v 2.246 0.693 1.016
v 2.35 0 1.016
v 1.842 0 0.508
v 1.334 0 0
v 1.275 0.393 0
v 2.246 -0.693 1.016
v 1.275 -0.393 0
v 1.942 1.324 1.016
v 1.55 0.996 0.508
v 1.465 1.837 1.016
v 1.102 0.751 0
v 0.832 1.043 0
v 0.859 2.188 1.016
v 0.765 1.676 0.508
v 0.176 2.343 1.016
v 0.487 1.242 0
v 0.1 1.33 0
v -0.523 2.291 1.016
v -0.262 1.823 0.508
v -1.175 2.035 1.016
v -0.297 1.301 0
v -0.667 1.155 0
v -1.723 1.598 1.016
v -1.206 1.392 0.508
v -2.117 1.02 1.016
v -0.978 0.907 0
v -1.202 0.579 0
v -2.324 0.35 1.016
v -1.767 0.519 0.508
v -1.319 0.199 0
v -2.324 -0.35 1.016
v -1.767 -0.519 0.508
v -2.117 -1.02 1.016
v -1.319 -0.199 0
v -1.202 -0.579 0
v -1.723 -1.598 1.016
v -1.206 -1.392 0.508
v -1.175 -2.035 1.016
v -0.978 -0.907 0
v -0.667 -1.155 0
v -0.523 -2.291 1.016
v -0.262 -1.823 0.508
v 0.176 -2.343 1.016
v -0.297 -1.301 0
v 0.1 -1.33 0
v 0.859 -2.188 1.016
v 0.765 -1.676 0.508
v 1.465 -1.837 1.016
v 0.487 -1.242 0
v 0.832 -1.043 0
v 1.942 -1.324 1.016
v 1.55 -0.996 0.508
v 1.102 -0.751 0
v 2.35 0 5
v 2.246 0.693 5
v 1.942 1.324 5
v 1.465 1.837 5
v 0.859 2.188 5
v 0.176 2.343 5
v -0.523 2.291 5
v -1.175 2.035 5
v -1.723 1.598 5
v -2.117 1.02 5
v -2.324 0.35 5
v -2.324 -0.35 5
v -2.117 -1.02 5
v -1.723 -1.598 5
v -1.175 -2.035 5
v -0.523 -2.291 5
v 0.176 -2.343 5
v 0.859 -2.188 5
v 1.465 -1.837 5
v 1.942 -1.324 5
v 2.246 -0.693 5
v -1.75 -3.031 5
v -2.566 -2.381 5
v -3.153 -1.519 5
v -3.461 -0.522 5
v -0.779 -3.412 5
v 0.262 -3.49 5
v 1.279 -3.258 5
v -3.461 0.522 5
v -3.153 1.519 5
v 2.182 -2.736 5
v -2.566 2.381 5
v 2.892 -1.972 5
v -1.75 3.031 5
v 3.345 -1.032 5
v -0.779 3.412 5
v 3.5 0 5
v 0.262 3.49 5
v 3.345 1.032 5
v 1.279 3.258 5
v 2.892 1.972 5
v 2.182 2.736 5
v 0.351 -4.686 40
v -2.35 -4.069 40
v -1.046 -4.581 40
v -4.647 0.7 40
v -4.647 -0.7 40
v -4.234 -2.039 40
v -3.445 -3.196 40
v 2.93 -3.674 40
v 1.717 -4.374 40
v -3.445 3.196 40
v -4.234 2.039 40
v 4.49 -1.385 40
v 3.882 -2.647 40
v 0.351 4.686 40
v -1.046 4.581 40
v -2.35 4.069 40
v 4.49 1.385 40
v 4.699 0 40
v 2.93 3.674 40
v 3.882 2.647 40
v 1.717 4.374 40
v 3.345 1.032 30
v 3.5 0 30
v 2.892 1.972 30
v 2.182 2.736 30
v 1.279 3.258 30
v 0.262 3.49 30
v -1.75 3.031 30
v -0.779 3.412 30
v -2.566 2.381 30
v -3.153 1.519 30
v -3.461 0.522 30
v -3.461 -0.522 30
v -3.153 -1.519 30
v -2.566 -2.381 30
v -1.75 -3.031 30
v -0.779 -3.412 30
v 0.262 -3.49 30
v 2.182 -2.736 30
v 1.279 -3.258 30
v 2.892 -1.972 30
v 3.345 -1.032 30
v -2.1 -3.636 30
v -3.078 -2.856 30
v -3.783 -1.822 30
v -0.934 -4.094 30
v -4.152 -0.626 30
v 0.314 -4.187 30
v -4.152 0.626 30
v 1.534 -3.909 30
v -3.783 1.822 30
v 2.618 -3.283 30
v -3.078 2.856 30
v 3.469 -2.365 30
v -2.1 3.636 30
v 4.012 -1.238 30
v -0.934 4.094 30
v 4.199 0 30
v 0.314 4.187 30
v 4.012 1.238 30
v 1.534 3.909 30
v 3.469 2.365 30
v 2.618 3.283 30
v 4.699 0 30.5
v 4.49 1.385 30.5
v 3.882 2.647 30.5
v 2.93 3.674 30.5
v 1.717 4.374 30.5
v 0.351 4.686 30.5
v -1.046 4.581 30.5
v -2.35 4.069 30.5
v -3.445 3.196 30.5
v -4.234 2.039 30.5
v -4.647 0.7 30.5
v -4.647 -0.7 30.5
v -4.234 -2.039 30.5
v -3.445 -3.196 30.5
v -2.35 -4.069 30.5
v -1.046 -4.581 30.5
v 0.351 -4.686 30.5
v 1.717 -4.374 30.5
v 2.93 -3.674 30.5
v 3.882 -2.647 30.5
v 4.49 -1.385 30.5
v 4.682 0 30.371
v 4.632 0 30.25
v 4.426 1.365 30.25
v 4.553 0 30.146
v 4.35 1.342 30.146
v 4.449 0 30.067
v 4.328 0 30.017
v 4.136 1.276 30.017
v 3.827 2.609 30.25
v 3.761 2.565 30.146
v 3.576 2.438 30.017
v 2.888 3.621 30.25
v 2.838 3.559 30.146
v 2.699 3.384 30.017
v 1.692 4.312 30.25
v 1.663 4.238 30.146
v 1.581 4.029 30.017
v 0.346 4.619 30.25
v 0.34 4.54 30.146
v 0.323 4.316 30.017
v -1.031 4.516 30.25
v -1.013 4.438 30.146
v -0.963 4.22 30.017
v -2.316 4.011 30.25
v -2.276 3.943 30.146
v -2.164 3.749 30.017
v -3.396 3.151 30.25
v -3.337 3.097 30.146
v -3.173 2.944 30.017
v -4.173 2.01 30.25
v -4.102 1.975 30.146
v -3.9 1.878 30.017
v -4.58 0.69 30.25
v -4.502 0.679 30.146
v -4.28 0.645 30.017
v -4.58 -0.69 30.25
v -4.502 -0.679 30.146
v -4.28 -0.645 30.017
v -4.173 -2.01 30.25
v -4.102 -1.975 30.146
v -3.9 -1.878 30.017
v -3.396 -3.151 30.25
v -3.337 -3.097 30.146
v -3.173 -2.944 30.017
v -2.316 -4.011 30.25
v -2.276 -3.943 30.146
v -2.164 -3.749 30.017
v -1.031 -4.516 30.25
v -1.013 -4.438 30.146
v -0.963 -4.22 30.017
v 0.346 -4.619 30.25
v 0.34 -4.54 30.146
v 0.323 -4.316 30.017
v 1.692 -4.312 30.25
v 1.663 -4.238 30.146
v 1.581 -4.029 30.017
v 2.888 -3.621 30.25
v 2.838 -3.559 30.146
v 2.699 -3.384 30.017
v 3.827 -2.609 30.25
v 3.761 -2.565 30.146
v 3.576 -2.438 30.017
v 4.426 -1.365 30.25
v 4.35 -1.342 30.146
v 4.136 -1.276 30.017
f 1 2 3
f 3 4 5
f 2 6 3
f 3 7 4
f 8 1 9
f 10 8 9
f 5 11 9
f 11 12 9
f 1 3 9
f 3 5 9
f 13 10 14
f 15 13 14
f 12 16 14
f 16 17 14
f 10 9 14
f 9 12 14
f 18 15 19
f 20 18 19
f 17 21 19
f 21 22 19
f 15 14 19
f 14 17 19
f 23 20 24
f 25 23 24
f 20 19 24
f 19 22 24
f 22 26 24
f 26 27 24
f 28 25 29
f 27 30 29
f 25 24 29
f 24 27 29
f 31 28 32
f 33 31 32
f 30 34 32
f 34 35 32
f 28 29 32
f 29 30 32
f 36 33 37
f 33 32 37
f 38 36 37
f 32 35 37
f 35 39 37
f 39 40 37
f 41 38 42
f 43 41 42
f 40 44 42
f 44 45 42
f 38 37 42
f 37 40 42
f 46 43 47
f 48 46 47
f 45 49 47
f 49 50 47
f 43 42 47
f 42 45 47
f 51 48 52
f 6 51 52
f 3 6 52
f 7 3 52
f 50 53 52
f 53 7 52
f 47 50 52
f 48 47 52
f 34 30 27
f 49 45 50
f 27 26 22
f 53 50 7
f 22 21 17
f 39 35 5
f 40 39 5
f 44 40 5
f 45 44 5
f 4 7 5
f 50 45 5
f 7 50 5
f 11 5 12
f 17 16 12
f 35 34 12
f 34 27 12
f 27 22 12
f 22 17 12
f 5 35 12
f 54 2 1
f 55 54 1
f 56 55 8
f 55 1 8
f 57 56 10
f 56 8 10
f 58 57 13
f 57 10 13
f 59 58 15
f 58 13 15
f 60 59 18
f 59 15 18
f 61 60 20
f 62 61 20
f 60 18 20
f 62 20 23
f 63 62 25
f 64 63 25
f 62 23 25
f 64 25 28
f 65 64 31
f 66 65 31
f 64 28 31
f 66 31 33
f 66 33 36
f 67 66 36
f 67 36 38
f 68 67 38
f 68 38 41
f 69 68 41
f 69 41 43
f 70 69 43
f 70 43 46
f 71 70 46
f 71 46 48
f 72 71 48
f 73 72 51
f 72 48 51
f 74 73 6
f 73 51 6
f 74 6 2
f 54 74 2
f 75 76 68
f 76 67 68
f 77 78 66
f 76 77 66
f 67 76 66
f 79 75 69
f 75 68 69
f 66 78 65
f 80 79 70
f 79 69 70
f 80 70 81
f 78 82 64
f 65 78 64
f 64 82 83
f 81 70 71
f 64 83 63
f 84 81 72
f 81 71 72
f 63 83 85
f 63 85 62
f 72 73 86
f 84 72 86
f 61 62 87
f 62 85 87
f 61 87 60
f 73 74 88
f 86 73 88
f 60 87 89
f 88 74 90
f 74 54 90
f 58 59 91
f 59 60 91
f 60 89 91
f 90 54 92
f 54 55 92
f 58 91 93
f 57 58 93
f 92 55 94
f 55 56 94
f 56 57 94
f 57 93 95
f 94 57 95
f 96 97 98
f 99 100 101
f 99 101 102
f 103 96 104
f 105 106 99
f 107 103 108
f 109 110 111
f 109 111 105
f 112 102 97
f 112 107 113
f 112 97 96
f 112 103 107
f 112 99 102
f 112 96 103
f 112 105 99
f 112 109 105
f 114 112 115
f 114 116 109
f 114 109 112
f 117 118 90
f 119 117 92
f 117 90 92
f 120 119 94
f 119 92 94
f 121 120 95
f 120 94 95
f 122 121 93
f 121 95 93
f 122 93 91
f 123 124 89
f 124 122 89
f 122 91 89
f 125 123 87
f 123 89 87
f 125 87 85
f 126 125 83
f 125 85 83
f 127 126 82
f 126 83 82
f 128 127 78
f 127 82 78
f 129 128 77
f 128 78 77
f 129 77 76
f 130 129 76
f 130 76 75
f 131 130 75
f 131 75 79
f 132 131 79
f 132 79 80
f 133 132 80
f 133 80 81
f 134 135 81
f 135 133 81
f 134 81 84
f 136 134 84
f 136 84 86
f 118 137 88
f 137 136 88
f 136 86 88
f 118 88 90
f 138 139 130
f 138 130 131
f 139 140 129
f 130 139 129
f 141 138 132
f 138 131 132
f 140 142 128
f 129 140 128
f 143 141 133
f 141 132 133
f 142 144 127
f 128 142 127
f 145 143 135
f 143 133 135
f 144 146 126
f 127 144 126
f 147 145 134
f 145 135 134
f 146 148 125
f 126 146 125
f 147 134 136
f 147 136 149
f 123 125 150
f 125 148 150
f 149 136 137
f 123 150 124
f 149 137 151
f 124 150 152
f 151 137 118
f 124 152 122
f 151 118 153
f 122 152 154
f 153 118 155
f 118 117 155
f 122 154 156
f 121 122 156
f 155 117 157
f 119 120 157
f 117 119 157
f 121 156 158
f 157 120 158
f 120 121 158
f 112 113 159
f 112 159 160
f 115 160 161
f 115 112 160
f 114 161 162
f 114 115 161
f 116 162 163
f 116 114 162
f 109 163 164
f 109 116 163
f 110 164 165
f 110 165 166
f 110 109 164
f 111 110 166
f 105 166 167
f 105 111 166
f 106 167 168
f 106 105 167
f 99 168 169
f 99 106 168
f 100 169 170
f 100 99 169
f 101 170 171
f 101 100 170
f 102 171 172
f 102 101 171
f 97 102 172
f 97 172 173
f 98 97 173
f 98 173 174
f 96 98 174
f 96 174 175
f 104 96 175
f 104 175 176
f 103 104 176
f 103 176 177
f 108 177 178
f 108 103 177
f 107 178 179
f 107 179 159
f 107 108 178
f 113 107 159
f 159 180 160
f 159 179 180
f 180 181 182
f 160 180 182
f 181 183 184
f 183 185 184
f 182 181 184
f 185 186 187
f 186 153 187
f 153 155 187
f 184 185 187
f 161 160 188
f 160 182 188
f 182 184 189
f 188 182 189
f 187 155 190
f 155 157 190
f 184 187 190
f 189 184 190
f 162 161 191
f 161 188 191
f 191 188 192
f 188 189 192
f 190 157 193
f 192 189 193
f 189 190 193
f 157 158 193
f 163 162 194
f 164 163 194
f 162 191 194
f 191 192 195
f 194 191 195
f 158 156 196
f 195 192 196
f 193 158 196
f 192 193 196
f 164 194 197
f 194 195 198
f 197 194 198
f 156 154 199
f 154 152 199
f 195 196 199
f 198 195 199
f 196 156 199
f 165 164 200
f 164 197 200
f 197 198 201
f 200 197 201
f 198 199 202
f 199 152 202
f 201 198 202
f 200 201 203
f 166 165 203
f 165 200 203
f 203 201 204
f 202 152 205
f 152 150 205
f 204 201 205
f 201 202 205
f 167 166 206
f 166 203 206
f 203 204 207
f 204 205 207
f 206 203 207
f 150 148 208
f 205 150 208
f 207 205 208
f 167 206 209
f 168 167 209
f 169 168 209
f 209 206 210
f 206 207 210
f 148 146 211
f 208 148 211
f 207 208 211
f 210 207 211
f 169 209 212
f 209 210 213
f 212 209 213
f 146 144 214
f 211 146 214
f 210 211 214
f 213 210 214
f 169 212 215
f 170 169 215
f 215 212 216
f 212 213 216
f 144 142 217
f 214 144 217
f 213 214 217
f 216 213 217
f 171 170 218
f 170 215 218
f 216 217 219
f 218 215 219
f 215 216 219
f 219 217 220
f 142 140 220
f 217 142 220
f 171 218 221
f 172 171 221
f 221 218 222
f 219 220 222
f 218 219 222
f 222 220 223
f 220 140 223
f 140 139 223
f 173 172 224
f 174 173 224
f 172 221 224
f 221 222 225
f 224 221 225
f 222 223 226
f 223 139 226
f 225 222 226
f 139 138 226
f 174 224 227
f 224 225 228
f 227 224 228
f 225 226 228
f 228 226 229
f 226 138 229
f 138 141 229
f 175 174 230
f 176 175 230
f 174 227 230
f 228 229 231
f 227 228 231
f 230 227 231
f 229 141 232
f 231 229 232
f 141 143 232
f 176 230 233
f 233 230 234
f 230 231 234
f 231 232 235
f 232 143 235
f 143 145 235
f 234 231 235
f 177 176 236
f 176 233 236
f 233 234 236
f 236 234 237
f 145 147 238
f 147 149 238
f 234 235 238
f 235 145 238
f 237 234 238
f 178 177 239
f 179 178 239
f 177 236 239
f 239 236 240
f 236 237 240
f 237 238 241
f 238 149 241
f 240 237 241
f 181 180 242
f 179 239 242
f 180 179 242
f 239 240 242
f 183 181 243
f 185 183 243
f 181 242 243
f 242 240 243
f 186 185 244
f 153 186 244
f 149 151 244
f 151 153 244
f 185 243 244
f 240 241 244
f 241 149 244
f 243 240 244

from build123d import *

# Parameters (mm, degrees)
F0_R     = 2.35
F1_DEPTH = 5
F2_R     = 3.5
F3_DEPTH = 35
F4_SIZE  = 1.016
F5_R     = 4.699
F6_DEPTH = 10
F7_R     = 0.5


with BuildPart() as f1:
    # F0 (on Top) → F1 (new body)
    with BuildSketch(Plane.XY):
        Circle(F0_R)
    extrude(amount=F1_DEPTH)

    # F2 (on face) → F3 (join)
    with BuildSketch(Plane.XY.offset(5)):
        Circle(F2_R)
    extrude(amount=F3_DEPTH)

    # F4
    f4_edges = [f1.edges().sort_by_distance(p)[0] for p in [
        (-2.35, 0, 0),
    ]]
    chamfer(f4_edges, length=F4_SIZE)

    # F5 (on face) → F6 (join)
    with BuildSketch(Plane.XY.offset(40)):
        Circle(F5_R)
    extrude(amount=-F6_DEPTH)

    # F7
    f7_edges = [f1.edges().sort_by_distance(p)[0] for p in [
        (-4.699, 0, 30),
    ]]
    fillet(f7_edges, radius=F7_R)


solid = f1.part
